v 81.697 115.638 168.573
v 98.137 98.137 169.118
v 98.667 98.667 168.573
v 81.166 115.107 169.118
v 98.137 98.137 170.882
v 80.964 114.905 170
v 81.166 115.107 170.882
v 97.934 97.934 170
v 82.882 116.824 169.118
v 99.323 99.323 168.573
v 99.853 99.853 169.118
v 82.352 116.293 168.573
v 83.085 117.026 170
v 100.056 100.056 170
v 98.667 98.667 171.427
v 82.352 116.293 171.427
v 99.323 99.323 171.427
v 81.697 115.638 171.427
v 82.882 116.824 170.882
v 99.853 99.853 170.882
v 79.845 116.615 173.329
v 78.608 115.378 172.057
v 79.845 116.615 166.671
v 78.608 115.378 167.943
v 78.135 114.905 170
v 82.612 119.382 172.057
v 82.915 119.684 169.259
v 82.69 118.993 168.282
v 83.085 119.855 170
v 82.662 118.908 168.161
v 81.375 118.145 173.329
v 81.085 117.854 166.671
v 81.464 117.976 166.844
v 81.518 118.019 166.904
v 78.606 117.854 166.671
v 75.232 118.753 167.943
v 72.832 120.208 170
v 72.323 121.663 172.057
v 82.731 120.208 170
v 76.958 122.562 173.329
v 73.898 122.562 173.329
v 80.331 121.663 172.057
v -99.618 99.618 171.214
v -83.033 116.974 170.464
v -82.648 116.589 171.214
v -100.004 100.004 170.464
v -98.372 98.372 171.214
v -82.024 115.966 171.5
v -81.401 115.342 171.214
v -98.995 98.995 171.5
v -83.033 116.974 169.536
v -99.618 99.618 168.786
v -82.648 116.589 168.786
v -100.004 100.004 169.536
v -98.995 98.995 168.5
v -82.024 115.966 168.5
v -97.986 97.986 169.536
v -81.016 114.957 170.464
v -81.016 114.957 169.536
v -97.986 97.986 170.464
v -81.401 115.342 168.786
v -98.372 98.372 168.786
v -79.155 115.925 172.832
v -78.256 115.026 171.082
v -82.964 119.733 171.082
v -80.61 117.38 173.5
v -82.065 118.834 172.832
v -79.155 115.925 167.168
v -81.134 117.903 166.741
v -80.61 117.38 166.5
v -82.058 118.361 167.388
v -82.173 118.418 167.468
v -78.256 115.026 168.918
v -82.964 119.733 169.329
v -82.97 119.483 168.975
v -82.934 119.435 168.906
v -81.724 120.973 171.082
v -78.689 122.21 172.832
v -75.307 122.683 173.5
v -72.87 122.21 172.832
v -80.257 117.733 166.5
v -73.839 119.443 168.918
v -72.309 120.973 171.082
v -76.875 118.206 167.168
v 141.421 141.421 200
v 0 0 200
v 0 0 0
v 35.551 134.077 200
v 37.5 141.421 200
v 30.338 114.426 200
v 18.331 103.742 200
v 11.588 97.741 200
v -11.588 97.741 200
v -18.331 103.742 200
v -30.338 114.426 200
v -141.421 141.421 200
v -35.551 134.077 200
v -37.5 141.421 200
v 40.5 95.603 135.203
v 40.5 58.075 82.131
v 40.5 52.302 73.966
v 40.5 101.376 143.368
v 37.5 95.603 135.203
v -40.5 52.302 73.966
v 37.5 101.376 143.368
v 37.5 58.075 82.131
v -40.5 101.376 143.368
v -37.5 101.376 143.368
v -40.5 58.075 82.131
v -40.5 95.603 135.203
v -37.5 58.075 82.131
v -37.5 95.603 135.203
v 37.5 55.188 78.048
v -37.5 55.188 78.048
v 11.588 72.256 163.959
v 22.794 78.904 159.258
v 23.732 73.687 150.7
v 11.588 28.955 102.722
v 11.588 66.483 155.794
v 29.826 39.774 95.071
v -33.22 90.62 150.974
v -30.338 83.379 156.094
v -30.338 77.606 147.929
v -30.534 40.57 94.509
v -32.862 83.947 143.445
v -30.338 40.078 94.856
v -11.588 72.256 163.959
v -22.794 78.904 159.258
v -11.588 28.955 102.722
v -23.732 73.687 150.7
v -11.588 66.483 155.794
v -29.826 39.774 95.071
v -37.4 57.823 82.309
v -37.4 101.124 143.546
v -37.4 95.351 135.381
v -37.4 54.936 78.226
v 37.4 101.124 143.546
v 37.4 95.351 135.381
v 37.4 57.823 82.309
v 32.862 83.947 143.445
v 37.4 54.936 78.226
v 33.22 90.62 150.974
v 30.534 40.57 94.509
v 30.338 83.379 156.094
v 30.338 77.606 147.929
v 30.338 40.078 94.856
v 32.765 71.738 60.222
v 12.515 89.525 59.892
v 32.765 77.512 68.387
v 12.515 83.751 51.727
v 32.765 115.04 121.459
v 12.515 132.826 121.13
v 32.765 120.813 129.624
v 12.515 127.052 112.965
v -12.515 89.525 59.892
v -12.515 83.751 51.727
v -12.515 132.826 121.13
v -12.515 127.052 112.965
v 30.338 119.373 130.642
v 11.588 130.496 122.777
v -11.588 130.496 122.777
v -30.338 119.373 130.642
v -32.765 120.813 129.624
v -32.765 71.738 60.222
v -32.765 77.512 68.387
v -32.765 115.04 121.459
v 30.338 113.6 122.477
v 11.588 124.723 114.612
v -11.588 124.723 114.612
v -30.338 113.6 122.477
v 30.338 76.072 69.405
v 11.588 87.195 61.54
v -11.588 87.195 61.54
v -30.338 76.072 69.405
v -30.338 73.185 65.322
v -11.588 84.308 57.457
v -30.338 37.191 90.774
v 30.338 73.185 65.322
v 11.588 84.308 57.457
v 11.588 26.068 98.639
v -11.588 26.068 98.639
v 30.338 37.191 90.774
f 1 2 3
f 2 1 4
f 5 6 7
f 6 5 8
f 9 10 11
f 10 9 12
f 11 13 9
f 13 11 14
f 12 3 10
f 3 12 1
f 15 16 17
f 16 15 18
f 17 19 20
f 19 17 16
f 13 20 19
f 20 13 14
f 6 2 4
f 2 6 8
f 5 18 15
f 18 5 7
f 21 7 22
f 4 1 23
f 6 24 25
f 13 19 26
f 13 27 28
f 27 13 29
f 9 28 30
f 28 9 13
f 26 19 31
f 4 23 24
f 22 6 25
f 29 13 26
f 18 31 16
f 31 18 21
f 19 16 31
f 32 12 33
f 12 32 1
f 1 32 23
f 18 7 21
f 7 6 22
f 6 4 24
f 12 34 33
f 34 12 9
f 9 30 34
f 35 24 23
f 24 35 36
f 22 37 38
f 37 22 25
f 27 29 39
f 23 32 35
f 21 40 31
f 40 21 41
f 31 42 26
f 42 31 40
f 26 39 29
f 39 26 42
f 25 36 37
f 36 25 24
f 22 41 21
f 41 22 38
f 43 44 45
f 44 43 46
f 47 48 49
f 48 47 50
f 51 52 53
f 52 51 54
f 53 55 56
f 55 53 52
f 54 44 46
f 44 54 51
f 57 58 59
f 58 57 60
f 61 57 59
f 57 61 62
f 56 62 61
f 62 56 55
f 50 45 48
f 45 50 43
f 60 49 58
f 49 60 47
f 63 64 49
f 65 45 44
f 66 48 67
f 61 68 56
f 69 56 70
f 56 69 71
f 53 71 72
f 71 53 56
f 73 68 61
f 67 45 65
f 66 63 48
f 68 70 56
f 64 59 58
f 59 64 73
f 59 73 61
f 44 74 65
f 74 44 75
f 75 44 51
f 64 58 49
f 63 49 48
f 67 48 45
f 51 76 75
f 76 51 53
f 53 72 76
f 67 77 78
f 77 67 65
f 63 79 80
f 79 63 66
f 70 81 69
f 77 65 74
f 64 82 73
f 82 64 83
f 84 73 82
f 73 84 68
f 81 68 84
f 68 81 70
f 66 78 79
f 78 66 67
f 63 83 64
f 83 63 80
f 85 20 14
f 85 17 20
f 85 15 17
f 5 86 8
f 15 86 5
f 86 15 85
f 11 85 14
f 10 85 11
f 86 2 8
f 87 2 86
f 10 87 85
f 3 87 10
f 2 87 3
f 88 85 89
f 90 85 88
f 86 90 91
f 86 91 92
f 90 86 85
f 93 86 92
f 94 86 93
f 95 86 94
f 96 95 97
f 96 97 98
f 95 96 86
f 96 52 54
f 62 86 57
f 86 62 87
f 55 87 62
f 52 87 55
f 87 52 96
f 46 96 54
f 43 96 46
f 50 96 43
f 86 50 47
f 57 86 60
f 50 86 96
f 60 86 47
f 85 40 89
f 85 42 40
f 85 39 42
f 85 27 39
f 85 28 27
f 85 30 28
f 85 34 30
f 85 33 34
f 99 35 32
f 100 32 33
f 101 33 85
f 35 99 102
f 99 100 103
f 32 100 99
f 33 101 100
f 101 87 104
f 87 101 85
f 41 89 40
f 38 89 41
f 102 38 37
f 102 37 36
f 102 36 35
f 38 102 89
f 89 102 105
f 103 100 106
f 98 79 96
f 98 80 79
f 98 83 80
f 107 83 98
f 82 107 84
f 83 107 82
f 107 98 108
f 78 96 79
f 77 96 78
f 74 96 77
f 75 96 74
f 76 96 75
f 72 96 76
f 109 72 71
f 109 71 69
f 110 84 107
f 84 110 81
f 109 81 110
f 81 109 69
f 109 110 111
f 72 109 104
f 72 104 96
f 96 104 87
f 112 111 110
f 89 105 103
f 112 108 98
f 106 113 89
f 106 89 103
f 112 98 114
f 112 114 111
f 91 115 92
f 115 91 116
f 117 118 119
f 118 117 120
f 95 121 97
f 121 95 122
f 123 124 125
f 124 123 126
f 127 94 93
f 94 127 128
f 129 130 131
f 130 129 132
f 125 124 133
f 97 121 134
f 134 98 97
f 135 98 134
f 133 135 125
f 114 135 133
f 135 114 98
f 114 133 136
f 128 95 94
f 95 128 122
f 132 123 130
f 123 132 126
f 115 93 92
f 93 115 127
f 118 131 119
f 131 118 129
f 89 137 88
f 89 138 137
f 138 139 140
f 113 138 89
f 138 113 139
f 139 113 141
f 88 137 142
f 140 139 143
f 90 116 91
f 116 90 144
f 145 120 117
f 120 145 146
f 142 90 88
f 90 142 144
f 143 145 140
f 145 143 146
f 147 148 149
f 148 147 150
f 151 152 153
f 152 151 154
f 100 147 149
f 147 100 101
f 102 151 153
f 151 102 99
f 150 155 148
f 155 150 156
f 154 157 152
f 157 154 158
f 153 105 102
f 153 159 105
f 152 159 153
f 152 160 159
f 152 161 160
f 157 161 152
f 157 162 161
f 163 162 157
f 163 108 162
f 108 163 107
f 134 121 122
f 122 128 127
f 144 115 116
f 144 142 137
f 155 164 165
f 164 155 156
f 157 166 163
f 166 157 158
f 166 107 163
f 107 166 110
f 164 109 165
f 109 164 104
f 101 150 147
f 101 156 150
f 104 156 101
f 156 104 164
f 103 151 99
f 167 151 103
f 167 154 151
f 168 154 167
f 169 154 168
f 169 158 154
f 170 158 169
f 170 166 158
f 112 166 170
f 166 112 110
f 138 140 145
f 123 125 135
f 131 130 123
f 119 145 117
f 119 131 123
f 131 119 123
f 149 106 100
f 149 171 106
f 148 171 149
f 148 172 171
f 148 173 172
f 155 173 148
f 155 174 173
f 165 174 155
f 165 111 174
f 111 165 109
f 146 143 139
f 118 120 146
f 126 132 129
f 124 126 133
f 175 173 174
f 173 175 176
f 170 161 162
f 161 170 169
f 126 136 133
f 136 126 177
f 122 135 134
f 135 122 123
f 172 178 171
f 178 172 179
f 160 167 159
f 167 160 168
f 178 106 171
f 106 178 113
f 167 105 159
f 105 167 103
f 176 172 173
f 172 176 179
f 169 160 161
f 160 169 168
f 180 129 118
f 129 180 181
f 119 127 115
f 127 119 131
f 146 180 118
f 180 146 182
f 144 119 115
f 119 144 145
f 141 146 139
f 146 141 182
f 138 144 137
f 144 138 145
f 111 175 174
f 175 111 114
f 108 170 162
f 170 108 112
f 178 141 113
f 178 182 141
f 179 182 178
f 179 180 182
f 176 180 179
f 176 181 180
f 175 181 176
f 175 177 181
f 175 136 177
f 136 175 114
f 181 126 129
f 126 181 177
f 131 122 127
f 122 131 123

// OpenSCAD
$fn=10;

module WithingsHome(){
    m=85;
    d=75;

    difference(){
        cylinder(r=d/2+3, h=m, center=true);
//        translate([0,0,m/2-2])linear_extrude(height=2)text(text="Withings home", font="Courier Bold", size=7, halign="center");
        translate([0,0,0])cylinder(r=d/2+3, h=m-20, center=true);
        translate([0,0,5])cylinder(r=d/2, h=m, center=true);
    }

}
function szog(t) = t*360;


//WithingsHome();

allvany();

module allvany(){
//difference(){
    s = 200;
    z = (s-37)/sqrt(3)/cos(30);
    rotate(45) 
    difference()
    {
        tetraeder(s);
        translate([s-60, -1, s-30]) rotate([-90,0,0]) furat();
        translate([-1, s-60, s-30]) rotate([0,90,0])furat();
        rotate(-45) translate([0,(z-31)/sqrt(2),z-31])rotate([-atan(1/sqrt(2)),0,0])cylinder(r=75/2, h=200);
    }
    translate([0,z/sqrt(2),z])rotate([-atan(1/sqrt(2)),0,0])WithingsHome();
    //translate([0,z/sqrt(2),z])rotate([szog($t),0,0])WithingsHome();
//}

}

module furat(){
    cylinder(r=1.5, h=30);
    translate([0,0,25]) cylinder(r1=1.5, r2=3.5, h=2);
    translate([0,0,27]) cylinder(r=3.5, h=10);
}
        

module tetraeder(s){
    te_points=[[0,0,0], //0
               [s,0,s], //1
               [0,s,s], //2
               [0,0,s]];//3
    te_faces=[[0,3,1],
              [0,1,2],
              [0,2,3],
              [3,2,1]];
    polyhedron(te_points, te_faces, convexity=10);
}
